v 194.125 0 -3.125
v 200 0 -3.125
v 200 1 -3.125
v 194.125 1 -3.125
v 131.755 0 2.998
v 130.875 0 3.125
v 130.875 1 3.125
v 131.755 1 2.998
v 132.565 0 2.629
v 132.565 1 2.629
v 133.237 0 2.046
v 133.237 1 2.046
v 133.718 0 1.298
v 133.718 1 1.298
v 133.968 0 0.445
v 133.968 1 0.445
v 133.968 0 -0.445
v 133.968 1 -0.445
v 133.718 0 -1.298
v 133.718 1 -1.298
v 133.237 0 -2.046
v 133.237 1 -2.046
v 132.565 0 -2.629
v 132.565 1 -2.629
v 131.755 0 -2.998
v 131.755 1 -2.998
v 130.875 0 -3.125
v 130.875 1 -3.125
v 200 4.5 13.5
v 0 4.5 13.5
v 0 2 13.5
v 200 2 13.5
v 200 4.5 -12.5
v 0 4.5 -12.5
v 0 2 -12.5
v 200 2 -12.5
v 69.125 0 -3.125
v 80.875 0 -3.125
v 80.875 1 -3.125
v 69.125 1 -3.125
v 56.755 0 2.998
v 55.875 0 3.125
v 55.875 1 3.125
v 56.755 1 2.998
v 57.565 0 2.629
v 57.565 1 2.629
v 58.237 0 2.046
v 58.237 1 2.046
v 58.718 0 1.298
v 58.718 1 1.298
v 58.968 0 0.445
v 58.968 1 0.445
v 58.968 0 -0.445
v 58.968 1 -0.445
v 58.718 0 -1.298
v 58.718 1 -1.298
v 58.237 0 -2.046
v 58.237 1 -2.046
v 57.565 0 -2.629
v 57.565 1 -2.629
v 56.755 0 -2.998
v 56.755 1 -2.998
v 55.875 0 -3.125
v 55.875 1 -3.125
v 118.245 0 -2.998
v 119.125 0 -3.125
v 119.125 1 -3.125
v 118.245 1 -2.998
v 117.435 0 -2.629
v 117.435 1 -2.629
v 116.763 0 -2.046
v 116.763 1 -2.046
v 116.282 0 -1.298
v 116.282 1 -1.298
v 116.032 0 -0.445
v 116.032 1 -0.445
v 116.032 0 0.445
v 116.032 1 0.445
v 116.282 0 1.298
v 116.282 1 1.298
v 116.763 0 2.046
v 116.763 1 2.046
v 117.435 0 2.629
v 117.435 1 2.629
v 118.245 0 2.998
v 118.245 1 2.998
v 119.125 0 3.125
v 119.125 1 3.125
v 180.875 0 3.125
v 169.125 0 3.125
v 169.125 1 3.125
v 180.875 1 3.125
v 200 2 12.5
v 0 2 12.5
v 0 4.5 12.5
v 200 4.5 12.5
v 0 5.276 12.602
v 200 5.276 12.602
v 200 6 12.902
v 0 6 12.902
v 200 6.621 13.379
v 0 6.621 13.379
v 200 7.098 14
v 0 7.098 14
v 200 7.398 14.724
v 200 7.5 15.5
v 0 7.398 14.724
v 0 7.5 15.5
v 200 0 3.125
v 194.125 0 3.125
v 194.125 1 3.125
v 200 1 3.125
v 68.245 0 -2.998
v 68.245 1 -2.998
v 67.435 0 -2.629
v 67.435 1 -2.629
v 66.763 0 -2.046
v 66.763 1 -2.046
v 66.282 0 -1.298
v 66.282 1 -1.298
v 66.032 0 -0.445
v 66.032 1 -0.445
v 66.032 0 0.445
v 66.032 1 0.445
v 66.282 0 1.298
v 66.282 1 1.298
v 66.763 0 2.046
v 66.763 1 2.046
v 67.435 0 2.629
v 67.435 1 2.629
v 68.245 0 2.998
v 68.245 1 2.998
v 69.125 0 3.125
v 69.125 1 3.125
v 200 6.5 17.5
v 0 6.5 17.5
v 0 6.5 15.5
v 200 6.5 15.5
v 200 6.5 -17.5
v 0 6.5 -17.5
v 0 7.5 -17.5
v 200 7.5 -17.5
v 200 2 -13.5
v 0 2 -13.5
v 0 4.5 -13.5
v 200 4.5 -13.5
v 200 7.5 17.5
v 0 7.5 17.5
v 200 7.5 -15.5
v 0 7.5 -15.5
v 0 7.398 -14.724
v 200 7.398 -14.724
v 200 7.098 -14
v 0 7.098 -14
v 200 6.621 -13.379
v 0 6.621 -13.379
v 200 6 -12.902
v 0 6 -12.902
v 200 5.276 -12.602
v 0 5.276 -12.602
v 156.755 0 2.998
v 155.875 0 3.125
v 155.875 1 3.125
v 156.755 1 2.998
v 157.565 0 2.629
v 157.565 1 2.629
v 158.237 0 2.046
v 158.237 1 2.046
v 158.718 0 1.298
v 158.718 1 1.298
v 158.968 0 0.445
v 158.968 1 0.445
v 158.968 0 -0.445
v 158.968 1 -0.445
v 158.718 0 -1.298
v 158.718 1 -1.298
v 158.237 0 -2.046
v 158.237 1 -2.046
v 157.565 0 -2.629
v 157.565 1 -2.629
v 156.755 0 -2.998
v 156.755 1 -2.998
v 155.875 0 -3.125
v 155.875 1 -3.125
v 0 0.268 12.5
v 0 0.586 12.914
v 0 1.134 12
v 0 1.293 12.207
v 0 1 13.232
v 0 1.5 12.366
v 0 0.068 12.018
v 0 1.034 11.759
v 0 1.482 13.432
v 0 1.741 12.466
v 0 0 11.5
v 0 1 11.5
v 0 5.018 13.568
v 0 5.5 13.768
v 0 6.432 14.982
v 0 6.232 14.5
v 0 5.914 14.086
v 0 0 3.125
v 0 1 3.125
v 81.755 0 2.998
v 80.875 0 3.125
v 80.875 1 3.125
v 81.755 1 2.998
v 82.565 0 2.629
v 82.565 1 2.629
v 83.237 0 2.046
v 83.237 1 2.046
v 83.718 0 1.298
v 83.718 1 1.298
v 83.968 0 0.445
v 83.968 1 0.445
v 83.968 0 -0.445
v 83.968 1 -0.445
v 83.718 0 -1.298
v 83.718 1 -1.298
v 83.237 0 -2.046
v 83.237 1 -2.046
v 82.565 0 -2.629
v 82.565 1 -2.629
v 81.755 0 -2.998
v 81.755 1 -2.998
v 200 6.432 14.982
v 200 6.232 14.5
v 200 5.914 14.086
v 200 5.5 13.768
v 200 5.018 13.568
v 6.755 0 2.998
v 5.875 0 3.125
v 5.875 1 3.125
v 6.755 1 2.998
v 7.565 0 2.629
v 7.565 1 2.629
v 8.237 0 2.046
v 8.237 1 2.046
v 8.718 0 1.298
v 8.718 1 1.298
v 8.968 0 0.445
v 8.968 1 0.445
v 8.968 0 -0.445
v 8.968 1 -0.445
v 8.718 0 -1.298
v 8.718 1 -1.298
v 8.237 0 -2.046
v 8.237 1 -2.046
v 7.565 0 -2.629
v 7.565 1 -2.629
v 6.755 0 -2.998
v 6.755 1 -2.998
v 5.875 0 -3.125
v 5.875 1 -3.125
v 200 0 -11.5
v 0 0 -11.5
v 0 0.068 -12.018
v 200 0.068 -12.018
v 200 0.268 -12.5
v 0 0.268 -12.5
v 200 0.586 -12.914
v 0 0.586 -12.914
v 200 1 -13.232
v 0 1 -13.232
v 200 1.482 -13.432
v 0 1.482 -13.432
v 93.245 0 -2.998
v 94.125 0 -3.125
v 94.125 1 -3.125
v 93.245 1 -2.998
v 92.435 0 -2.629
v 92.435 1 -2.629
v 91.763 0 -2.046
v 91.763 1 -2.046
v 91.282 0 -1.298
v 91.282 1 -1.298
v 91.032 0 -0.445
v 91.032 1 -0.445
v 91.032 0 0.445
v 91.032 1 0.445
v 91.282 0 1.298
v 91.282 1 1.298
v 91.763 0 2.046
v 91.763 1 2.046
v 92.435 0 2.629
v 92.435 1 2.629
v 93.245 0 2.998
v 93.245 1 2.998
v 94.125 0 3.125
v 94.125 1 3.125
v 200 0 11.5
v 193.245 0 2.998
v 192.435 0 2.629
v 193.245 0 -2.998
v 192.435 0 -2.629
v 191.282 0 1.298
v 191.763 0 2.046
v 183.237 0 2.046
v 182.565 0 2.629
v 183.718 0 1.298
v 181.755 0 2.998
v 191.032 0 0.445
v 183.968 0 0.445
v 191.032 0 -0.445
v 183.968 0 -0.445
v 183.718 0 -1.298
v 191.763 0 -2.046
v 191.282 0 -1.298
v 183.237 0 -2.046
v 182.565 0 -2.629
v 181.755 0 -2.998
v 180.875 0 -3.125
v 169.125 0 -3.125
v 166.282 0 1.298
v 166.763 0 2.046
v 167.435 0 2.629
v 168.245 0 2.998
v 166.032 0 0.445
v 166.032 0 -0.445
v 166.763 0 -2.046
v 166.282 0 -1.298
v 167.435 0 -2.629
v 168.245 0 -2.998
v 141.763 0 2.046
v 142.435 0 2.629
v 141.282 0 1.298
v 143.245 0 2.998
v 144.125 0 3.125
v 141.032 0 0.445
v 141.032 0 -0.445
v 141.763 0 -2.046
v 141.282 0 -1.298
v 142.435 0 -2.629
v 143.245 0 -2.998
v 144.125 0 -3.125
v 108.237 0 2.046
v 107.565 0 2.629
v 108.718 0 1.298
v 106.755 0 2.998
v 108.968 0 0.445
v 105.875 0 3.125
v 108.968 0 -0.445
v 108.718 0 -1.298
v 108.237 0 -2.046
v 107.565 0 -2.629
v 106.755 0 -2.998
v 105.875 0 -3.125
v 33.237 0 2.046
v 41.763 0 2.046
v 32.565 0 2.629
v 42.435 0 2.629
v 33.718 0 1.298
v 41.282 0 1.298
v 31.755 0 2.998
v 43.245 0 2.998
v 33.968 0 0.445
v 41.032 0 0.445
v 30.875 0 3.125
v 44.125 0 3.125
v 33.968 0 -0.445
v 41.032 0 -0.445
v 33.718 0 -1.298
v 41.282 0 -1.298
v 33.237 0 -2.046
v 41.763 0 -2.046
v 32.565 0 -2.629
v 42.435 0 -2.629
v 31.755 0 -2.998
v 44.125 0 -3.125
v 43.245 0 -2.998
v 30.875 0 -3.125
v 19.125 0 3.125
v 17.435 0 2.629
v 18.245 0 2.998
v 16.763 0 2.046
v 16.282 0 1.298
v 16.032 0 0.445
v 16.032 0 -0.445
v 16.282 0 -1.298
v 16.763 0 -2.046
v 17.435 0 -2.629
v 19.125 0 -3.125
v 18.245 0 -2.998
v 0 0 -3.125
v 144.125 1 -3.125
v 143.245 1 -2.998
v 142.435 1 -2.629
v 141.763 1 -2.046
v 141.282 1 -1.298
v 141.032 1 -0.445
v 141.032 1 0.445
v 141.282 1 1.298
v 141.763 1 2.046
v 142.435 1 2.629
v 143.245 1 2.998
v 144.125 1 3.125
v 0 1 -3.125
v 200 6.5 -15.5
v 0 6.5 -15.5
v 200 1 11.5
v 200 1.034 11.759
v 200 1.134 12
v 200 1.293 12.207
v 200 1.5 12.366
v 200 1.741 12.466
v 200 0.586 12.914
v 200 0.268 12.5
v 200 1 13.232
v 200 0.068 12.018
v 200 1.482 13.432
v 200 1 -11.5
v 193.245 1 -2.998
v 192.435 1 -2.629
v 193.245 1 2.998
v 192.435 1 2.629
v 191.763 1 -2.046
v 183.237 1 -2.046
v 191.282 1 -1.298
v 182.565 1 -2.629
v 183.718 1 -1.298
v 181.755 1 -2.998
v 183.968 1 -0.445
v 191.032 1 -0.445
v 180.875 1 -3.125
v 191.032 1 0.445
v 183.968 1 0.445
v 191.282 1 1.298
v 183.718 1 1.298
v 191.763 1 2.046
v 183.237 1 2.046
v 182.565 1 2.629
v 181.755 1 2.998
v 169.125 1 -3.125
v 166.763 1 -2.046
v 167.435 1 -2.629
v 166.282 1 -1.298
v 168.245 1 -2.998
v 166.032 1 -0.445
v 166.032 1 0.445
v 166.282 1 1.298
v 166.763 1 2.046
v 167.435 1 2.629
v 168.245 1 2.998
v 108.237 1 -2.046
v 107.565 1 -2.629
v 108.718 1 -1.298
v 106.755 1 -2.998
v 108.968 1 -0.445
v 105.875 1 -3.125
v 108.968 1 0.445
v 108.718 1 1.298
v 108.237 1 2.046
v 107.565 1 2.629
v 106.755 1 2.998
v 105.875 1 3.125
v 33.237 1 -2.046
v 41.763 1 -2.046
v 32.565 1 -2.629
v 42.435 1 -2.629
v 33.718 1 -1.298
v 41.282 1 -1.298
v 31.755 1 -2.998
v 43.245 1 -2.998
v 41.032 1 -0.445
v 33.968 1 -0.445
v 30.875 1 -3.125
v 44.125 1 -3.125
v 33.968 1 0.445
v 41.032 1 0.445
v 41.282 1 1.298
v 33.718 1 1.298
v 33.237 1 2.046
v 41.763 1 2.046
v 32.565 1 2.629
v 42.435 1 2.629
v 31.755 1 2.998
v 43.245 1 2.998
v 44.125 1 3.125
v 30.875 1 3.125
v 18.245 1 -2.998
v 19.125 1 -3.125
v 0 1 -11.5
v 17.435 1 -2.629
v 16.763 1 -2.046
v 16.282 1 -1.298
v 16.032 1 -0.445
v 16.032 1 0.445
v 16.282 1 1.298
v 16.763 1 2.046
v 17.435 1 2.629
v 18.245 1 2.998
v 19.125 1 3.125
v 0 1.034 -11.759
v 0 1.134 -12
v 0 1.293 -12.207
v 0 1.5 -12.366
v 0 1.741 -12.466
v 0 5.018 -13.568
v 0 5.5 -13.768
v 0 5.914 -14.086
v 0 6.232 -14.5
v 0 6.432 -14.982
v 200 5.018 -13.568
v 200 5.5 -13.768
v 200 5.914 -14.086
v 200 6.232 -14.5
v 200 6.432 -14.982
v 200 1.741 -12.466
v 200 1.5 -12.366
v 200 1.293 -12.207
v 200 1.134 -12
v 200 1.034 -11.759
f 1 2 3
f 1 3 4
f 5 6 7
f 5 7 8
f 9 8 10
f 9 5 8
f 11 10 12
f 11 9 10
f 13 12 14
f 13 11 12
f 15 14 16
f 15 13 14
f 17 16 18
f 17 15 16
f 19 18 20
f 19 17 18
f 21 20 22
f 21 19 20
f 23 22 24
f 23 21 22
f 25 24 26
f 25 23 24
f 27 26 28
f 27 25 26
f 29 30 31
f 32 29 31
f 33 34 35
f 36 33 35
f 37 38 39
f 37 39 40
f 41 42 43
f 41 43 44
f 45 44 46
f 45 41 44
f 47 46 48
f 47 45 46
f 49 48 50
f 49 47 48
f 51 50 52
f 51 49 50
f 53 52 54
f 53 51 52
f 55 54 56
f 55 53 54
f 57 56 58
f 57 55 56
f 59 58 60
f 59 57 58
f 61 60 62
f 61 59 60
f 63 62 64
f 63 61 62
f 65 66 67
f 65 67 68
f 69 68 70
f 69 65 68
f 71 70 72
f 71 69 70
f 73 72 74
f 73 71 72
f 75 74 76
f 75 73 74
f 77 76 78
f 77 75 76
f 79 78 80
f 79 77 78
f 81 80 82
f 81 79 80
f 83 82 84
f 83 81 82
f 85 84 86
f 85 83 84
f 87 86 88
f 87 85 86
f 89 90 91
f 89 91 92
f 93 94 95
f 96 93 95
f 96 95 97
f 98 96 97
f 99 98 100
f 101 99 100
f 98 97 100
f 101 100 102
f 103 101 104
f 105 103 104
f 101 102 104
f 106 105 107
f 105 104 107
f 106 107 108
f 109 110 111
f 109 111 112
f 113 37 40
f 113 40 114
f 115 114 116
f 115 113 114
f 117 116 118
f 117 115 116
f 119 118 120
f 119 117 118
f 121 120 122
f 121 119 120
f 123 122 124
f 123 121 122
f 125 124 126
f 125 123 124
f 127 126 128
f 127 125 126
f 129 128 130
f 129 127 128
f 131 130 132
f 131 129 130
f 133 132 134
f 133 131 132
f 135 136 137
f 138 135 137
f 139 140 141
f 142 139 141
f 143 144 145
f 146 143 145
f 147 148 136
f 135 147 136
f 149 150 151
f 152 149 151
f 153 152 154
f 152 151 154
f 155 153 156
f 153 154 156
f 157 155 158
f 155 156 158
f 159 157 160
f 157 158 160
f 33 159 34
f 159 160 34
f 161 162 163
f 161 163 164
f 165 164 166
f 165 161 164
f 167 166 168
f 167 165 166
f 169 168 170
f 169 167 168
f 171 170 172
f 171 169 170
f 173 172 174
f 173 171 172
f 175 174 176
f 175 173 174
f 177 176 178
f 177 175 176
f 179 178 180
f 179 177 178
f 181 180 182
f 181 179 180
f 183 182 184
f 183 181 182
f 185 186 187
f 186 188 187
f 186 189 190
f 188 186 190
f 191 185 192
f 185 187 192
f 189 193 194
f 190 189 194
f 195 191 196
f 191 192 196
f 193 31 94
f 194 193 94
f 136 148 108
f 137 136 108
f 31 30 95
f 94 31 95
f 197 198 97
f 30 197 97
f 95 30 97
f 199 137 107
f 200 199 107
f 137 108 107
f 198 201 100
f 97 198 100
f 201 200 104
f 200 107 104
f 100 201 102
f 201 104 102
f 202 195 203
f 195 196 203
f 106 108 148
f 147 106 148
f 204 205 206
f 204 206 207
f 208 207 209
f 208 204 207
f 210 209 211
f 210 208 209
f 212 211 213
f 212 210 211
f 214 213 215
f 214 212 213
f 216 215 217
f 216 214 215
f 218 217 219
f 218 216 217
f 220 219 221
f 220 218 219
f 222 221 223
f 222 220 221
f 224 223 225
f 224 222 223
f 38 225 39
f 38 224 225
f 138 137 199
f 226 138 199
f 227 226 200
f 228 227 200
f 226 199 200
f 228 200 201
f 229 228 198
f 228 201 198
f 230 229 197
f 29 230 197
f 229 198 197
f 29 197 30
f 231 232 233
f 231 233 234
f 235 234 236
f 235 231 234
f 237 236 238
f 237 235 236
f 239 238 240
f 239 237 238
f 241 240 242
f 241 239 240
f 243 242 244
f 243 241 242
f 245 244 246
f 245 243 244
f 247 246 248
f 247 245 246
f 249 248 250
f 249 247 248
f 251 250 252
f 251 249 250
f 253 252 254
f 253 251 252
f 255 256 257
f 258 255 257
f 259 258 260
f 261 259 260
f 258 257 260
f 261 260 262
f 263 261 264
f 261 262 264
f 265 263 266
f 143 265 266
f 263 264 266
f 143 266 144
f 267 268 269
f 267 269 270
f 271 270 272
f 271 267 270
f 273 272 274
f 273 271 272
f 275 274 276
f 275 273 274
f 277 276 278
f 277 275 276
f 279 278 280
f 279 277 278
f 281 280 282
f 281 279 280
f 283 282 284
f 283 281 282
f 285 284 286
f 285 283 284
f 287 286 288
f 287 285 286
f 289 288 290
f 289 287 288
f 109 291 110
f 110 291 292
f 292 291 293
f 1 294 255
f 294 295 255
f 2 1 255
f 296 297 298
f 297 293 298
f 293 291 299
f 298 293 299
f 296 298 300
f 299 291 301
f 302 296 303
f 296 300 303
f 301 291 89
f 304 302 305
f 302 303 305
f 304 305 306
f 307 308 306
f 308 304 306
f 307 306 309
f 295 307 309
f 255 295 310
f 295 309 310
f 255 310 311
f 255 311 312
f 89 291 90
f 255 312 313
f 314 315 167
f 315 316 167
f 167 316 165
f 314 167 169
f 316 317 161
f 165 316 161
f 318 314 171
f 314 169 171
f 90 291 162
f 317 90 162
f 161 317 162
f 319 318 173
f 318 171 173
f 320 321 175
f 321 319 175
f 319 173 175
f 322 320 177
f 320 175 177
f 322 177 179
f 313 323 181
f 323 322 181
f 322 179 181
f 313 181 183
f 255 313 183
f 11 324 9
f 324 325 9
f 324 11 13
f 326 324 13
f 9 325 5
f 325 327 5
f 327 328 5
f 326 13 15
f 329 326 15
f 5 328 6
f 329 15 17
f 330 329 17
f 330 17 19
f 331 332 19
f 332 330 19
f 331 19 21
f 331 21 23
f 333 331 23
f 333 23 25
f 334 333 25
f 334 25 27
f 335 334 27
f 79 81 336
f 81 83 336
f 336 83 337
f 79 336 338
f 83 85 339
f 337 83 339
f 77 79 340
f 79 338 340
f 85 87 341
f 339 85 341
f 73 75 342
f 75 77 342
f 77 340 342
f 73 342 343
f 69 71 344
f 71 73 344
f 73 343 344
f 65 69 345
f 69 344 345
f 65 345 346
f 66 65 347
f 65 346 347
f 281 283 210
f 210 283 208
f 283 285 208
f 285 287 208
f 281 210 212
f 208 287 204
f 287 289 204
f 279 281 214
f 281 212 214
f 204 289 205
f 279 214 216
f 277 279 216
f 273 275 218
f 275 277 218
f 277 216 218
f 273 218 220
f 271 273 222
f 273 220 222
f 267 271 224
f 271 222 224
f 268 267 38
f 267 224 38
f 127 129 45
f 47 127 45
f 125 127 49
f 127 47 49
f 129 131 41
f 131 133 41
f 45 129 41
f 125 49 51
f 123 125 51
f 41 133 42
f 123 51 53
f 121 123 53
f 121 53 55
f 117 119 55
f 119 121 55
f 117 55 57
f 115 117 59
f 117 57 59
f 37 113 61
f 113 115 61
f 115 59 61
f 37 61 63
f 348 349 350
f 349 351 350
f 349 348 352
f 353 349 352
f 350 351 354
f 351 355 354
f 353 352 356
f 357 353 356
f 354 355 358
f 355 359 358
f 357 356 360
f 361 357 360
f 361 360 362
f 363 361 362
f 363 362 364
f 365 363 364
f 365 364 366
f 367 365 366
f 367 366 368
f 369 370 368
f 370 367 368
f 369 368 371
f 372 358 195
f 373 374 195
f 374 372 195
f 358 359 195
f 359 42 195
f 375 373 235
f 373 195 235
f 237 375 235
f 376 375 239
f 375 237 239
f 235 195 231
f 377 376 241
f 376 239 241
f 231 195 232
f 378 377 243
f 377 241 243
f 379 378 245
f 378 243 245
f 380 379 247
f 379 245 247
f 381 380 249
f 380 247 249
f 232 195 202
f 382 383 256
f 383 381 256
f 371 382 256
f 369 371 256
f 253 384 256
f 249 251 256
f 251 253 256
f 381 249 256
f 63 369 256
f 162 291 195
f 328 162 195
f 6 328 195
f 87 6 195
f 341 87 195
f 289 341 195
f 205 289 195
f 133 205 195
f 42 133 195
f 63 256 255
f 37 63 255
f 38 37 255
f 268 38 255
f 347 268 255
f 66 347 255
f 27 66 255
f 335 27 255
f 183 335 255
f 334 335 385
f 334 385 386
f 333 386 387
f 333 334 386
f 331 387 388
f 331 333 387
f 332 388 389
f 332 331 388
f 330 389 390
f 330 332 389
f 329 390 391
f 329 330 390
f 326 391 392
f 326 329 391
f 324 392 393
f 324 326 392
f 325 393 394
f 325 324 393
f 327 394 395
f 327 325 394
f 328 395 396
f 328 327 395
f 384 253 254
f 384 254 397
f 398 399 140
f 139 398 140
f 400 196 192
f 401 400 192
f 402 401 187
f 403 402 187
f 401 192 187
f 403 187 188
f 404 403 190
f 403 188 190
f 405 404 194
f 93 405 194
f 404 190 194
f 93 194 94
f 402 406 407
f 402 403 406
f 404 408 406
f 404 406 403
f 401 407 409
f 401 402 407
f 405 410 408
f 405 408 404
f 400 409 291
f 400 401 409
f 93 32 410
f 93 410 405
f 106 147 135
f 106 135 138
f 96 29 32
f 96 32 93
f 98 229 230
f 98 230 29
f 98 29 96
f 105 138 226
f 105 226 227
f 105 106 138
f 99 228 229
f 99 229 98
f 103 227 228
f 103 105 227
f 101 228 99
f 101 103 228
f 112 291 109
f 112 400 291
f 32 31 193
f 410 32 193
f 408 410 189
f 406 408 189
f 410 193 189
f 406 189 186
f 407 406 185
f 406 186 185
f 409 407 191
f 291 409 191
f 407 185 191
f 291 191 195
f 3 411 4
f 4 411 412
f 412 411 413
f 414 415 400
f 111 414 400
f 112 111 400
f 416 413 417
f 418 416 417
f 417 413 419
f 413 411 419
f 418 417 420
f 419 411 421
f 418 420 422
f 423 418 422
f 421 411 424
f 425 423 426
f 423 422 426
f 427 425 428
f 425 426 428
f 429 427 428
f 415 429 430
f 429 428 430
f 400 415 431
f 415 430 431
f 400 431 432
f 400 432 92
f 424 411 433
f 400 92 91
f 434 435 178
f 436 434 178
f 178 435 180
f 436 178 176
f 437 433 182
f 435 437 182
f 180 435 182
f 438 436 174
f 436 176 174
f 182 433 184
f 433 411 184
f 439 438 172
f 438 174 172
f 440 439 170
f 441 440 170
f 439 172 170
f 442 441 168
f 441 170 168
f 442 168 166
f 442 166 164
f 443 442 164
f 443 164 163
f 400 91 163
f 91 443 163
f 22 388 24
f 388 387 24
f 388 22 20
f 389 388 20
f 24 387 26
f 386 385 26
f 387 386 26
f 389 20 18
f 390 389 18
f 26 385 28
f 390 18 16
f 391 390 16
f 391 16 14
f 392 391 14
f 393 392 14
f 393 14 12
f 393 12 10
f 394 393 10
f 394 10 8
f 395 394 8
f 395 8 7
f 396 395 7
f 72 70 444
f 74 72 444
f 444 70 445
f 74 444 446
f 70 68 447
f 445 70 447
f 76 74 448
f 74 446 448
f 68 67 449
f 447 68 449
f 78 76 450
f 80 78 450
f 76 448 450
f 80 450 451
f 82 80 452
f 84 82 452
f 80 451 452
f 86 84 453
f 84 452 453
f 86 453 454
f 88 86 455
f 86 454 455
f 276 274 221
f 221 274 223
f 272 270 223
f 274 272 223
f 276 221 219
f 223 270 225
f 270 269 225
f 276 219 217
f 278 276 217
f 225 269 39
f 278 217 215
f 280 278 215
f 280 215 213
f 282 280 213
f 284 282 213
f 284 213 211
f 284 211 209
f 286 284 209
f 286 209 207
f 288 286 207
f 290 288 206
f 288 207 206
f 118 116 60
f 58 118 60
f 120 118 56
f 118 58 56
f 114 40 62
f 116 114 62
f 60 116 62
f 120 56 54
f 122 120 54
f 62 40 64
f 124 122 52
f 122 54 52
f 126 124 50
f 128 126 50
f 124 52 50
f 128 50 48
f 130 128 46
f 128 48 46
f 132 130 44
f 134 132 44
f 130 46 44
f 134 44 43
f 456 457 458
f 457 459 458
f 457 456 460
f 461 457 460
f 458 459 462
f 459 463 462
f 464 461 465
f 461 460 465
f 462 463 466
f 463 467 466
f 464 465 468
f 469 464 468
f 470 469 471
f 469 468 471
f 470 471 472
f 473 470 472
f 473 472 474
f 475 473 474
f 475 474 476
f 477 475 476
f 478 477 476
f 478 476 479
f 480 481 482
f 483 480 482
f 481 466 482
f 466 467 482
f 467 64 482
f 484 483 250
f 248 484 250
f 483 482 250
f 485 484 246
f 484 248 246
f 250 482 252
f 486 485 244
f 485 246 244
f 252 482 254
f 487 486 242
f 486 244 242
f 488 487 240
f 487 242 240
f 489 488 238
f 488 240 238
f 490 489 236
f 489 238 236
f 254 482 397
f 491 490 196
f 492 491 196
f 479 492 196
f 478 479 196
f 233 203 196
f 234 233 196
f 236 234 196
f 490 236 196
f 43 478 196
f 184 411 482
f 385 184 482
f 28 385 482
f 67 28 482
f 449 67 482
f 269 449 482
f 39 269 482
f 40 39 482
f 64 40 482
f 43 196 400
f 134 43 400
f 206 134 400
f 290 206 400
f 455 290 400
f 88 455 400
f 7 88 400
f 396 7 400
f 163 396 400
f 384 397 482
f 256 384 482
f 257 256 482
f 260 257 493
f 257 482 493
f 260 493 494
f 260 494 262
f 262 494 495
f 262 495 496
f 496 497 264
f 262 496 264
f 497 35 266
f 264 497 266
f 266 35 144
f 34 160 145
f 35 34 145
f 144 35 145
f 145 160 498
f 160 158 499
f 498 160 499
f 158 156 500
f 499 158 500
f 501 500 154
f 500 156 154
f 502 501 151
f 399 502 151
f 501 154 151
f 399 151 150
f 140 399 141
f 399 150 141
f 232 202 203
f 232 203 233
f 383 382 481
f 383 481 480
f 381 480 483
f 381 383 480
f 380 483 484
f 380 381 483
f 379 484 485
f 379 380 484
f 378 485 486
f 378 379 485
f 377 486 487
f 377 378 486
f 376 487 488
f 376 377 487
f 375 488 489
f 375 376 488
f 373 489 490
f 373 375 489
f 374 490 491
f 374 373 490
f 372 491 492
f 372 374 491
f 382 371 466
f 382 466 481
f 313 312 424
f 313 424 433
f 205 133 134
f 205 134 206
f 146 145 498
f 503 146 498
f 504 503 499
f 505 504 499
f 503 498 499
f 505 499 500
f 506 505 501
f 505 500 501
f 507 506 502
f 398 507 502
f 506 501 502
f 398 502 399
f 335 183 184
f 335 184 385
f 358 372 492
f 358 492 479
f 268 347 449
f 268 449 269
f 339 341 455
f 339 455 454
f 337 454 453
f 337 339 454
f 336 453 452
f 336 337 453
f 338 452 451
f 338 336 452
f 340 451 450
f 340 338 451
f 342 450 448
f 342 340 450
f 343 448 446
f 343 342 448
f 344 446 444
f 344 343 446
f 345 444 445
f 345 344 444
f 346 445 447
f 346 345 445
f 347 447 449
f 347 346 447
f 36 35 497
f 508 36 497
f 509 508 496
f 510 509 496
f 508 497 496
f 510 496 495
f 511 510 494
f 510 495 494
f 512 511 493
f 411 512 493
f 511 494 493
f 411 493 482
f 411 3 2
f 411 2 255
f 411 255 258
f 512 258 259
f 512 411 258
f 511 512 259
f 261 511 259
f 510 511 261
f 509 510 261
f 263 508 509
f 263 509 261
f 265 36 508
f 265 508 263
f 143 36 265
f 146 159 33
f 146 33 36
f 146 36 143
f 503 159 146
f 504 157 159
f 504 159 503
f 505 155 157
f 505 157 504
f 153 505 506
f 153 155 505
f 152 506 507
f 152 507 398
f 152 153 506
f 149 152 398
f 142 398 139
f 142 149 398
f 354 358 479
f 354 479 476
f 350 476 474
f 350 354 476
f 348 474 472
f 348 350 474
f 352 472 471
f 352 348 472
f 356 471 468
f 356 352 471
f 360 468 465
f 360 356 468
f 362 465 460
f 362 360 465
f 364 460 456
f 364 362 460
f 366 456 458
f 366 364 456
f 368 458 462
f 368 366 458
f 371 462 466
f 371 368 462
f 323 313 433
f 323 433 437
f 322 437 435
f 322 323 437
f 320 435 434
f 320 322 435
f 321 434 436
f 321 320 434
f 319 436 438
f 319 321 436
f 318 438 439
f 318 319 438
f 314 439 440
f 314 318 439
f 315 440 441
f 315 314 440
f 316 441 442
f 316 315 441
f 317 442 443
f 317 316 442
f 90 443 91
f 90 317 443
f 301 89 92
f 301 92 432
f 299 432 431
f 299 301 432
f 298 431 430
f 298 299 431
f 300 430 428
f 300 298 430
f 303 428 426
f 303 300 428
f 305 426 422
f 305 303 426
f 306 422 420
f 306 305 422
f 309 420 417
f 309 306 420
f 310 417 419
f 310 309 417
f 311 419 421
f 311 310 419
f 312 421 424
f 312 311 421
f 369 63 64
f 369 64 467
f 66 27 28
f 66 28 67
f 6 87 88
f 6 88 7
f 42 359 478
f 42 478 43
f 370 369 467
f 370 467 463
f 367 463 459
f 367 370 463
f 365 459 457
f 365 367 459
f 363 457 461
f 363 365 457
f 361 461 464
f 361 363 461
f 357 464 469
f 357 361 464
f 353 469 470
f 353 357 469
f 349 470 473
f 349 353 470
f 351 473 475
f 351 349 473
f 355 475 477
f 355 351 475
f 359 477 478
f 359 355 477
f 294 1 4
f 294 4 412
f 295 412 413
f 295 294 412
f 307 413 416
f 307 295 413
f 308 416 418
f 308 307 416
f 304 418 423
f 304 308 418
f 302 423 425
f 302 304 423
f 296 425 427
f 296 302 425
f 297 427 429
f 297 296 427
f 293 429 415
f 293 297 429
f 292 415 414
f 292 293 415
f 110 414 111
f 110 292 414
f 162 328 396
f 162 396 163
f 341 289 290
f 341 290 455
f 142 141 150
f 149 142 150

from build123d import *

# Parameters (mm, degrees)
EXTRUDE_THIN1_DEPTH = 200
CUT_EXTRUDE1_DEPTH  = 1
LPATTERN1_COUNT     = 9
LPATTERN1_PITCH     = 25


with BuildPart() as part:
    # Sketch1 → Extrude-Thin1 (new body)
    with BuildSketch(Plane(origin=(0, 0, 0), x_dir=(0, 0, -1), z_dir=(1, 0, 0))):
        with BuildLine():
            Line((-17.5, 6.5), (-15.5, 6.5))
            ThreePointArc((-15.5, 6.5), (-14.085786438, 5.914213562), (-13.5, 4.5))
            Line((-13.5, 4.5), (-13.5, 2))
            ThreePointArc((-13.5, 2), (-12.914213562, 0.585786438), (-11.5, 0))
            Line((-11.5, 0), (11.5, 0))
            ThreePointArc((11.5, 0), (12.914213562, 0.585786438), (13.5, 2))
            Line((13.5, 2), (13.5, 4.5))
            ThreePointArc((13.5, 4.5), (14.085786438, 5.914213562), (15.5, 6.5))
            Line((15.5, 6.5), (17.5, 6.5))
            Line((17.5, 6.5), (17.5, 7.5))
            Line((17.5, 7.5), (15.5, 7.5))
            ThreePointArc((15.5, 7.5), (13.378679656, 6.621320344), (12.5, 4.5))
            Line((12.5, 4.5), (12.5, 2))
            ThreePointArc((12.5, 2), (12.207106781, 1.292893219), (11.5, 1))
            Line((11.5, 1), (-11.5, 1))
            ThreePointArc((-11.5, 1), (-12.207106781, 1.292893219), (-12.5, 2))
            Line((-12.5, 2), (-12.5, 4.5))
            ThreePointArc((-12.5, 4.5), (-13.378679656, 6.621320344), (-15.5, 7.5))
            Line((-15.5, 7.5), (-17.5, 7.5))
            Line((-17.5, 7.5), (-17.5, 6.5))
        make_face()
    extrude(amount=EXTRUDE_THIN1_DEPTH)

    # Sketch2 → Cut-Extrude1 (cut)
    with BuildSketch(Plane.XZ):
        with BuildLine():
            Line((-5.875, 3.125), (5.875, 3.125))
            ThreePointArc((5.875, 3.125), (9, 0), (5.875, -3.125))
            Line((5.875, -3.125), (-5.875, -3.125))
            ThreePointArc((-5.875, -3.125), (-9, 0), (-5.875, 3.125))
        make_face()
    cut_extrude1 = extrude(amount=-CUT_EXTRUDE1_DEPTH, mode=Mode.SUBTRACT)

    # LPattern1: Cut-Extrude1 ×9
    with Locations(*[(i * LPATTERN1_PITCH, 0, 0) for i in range(1, LPATTERN1_COUNT)]):
        add(cut_extrude1, mode=Mode.SUBTRACT)


solid = part.part
